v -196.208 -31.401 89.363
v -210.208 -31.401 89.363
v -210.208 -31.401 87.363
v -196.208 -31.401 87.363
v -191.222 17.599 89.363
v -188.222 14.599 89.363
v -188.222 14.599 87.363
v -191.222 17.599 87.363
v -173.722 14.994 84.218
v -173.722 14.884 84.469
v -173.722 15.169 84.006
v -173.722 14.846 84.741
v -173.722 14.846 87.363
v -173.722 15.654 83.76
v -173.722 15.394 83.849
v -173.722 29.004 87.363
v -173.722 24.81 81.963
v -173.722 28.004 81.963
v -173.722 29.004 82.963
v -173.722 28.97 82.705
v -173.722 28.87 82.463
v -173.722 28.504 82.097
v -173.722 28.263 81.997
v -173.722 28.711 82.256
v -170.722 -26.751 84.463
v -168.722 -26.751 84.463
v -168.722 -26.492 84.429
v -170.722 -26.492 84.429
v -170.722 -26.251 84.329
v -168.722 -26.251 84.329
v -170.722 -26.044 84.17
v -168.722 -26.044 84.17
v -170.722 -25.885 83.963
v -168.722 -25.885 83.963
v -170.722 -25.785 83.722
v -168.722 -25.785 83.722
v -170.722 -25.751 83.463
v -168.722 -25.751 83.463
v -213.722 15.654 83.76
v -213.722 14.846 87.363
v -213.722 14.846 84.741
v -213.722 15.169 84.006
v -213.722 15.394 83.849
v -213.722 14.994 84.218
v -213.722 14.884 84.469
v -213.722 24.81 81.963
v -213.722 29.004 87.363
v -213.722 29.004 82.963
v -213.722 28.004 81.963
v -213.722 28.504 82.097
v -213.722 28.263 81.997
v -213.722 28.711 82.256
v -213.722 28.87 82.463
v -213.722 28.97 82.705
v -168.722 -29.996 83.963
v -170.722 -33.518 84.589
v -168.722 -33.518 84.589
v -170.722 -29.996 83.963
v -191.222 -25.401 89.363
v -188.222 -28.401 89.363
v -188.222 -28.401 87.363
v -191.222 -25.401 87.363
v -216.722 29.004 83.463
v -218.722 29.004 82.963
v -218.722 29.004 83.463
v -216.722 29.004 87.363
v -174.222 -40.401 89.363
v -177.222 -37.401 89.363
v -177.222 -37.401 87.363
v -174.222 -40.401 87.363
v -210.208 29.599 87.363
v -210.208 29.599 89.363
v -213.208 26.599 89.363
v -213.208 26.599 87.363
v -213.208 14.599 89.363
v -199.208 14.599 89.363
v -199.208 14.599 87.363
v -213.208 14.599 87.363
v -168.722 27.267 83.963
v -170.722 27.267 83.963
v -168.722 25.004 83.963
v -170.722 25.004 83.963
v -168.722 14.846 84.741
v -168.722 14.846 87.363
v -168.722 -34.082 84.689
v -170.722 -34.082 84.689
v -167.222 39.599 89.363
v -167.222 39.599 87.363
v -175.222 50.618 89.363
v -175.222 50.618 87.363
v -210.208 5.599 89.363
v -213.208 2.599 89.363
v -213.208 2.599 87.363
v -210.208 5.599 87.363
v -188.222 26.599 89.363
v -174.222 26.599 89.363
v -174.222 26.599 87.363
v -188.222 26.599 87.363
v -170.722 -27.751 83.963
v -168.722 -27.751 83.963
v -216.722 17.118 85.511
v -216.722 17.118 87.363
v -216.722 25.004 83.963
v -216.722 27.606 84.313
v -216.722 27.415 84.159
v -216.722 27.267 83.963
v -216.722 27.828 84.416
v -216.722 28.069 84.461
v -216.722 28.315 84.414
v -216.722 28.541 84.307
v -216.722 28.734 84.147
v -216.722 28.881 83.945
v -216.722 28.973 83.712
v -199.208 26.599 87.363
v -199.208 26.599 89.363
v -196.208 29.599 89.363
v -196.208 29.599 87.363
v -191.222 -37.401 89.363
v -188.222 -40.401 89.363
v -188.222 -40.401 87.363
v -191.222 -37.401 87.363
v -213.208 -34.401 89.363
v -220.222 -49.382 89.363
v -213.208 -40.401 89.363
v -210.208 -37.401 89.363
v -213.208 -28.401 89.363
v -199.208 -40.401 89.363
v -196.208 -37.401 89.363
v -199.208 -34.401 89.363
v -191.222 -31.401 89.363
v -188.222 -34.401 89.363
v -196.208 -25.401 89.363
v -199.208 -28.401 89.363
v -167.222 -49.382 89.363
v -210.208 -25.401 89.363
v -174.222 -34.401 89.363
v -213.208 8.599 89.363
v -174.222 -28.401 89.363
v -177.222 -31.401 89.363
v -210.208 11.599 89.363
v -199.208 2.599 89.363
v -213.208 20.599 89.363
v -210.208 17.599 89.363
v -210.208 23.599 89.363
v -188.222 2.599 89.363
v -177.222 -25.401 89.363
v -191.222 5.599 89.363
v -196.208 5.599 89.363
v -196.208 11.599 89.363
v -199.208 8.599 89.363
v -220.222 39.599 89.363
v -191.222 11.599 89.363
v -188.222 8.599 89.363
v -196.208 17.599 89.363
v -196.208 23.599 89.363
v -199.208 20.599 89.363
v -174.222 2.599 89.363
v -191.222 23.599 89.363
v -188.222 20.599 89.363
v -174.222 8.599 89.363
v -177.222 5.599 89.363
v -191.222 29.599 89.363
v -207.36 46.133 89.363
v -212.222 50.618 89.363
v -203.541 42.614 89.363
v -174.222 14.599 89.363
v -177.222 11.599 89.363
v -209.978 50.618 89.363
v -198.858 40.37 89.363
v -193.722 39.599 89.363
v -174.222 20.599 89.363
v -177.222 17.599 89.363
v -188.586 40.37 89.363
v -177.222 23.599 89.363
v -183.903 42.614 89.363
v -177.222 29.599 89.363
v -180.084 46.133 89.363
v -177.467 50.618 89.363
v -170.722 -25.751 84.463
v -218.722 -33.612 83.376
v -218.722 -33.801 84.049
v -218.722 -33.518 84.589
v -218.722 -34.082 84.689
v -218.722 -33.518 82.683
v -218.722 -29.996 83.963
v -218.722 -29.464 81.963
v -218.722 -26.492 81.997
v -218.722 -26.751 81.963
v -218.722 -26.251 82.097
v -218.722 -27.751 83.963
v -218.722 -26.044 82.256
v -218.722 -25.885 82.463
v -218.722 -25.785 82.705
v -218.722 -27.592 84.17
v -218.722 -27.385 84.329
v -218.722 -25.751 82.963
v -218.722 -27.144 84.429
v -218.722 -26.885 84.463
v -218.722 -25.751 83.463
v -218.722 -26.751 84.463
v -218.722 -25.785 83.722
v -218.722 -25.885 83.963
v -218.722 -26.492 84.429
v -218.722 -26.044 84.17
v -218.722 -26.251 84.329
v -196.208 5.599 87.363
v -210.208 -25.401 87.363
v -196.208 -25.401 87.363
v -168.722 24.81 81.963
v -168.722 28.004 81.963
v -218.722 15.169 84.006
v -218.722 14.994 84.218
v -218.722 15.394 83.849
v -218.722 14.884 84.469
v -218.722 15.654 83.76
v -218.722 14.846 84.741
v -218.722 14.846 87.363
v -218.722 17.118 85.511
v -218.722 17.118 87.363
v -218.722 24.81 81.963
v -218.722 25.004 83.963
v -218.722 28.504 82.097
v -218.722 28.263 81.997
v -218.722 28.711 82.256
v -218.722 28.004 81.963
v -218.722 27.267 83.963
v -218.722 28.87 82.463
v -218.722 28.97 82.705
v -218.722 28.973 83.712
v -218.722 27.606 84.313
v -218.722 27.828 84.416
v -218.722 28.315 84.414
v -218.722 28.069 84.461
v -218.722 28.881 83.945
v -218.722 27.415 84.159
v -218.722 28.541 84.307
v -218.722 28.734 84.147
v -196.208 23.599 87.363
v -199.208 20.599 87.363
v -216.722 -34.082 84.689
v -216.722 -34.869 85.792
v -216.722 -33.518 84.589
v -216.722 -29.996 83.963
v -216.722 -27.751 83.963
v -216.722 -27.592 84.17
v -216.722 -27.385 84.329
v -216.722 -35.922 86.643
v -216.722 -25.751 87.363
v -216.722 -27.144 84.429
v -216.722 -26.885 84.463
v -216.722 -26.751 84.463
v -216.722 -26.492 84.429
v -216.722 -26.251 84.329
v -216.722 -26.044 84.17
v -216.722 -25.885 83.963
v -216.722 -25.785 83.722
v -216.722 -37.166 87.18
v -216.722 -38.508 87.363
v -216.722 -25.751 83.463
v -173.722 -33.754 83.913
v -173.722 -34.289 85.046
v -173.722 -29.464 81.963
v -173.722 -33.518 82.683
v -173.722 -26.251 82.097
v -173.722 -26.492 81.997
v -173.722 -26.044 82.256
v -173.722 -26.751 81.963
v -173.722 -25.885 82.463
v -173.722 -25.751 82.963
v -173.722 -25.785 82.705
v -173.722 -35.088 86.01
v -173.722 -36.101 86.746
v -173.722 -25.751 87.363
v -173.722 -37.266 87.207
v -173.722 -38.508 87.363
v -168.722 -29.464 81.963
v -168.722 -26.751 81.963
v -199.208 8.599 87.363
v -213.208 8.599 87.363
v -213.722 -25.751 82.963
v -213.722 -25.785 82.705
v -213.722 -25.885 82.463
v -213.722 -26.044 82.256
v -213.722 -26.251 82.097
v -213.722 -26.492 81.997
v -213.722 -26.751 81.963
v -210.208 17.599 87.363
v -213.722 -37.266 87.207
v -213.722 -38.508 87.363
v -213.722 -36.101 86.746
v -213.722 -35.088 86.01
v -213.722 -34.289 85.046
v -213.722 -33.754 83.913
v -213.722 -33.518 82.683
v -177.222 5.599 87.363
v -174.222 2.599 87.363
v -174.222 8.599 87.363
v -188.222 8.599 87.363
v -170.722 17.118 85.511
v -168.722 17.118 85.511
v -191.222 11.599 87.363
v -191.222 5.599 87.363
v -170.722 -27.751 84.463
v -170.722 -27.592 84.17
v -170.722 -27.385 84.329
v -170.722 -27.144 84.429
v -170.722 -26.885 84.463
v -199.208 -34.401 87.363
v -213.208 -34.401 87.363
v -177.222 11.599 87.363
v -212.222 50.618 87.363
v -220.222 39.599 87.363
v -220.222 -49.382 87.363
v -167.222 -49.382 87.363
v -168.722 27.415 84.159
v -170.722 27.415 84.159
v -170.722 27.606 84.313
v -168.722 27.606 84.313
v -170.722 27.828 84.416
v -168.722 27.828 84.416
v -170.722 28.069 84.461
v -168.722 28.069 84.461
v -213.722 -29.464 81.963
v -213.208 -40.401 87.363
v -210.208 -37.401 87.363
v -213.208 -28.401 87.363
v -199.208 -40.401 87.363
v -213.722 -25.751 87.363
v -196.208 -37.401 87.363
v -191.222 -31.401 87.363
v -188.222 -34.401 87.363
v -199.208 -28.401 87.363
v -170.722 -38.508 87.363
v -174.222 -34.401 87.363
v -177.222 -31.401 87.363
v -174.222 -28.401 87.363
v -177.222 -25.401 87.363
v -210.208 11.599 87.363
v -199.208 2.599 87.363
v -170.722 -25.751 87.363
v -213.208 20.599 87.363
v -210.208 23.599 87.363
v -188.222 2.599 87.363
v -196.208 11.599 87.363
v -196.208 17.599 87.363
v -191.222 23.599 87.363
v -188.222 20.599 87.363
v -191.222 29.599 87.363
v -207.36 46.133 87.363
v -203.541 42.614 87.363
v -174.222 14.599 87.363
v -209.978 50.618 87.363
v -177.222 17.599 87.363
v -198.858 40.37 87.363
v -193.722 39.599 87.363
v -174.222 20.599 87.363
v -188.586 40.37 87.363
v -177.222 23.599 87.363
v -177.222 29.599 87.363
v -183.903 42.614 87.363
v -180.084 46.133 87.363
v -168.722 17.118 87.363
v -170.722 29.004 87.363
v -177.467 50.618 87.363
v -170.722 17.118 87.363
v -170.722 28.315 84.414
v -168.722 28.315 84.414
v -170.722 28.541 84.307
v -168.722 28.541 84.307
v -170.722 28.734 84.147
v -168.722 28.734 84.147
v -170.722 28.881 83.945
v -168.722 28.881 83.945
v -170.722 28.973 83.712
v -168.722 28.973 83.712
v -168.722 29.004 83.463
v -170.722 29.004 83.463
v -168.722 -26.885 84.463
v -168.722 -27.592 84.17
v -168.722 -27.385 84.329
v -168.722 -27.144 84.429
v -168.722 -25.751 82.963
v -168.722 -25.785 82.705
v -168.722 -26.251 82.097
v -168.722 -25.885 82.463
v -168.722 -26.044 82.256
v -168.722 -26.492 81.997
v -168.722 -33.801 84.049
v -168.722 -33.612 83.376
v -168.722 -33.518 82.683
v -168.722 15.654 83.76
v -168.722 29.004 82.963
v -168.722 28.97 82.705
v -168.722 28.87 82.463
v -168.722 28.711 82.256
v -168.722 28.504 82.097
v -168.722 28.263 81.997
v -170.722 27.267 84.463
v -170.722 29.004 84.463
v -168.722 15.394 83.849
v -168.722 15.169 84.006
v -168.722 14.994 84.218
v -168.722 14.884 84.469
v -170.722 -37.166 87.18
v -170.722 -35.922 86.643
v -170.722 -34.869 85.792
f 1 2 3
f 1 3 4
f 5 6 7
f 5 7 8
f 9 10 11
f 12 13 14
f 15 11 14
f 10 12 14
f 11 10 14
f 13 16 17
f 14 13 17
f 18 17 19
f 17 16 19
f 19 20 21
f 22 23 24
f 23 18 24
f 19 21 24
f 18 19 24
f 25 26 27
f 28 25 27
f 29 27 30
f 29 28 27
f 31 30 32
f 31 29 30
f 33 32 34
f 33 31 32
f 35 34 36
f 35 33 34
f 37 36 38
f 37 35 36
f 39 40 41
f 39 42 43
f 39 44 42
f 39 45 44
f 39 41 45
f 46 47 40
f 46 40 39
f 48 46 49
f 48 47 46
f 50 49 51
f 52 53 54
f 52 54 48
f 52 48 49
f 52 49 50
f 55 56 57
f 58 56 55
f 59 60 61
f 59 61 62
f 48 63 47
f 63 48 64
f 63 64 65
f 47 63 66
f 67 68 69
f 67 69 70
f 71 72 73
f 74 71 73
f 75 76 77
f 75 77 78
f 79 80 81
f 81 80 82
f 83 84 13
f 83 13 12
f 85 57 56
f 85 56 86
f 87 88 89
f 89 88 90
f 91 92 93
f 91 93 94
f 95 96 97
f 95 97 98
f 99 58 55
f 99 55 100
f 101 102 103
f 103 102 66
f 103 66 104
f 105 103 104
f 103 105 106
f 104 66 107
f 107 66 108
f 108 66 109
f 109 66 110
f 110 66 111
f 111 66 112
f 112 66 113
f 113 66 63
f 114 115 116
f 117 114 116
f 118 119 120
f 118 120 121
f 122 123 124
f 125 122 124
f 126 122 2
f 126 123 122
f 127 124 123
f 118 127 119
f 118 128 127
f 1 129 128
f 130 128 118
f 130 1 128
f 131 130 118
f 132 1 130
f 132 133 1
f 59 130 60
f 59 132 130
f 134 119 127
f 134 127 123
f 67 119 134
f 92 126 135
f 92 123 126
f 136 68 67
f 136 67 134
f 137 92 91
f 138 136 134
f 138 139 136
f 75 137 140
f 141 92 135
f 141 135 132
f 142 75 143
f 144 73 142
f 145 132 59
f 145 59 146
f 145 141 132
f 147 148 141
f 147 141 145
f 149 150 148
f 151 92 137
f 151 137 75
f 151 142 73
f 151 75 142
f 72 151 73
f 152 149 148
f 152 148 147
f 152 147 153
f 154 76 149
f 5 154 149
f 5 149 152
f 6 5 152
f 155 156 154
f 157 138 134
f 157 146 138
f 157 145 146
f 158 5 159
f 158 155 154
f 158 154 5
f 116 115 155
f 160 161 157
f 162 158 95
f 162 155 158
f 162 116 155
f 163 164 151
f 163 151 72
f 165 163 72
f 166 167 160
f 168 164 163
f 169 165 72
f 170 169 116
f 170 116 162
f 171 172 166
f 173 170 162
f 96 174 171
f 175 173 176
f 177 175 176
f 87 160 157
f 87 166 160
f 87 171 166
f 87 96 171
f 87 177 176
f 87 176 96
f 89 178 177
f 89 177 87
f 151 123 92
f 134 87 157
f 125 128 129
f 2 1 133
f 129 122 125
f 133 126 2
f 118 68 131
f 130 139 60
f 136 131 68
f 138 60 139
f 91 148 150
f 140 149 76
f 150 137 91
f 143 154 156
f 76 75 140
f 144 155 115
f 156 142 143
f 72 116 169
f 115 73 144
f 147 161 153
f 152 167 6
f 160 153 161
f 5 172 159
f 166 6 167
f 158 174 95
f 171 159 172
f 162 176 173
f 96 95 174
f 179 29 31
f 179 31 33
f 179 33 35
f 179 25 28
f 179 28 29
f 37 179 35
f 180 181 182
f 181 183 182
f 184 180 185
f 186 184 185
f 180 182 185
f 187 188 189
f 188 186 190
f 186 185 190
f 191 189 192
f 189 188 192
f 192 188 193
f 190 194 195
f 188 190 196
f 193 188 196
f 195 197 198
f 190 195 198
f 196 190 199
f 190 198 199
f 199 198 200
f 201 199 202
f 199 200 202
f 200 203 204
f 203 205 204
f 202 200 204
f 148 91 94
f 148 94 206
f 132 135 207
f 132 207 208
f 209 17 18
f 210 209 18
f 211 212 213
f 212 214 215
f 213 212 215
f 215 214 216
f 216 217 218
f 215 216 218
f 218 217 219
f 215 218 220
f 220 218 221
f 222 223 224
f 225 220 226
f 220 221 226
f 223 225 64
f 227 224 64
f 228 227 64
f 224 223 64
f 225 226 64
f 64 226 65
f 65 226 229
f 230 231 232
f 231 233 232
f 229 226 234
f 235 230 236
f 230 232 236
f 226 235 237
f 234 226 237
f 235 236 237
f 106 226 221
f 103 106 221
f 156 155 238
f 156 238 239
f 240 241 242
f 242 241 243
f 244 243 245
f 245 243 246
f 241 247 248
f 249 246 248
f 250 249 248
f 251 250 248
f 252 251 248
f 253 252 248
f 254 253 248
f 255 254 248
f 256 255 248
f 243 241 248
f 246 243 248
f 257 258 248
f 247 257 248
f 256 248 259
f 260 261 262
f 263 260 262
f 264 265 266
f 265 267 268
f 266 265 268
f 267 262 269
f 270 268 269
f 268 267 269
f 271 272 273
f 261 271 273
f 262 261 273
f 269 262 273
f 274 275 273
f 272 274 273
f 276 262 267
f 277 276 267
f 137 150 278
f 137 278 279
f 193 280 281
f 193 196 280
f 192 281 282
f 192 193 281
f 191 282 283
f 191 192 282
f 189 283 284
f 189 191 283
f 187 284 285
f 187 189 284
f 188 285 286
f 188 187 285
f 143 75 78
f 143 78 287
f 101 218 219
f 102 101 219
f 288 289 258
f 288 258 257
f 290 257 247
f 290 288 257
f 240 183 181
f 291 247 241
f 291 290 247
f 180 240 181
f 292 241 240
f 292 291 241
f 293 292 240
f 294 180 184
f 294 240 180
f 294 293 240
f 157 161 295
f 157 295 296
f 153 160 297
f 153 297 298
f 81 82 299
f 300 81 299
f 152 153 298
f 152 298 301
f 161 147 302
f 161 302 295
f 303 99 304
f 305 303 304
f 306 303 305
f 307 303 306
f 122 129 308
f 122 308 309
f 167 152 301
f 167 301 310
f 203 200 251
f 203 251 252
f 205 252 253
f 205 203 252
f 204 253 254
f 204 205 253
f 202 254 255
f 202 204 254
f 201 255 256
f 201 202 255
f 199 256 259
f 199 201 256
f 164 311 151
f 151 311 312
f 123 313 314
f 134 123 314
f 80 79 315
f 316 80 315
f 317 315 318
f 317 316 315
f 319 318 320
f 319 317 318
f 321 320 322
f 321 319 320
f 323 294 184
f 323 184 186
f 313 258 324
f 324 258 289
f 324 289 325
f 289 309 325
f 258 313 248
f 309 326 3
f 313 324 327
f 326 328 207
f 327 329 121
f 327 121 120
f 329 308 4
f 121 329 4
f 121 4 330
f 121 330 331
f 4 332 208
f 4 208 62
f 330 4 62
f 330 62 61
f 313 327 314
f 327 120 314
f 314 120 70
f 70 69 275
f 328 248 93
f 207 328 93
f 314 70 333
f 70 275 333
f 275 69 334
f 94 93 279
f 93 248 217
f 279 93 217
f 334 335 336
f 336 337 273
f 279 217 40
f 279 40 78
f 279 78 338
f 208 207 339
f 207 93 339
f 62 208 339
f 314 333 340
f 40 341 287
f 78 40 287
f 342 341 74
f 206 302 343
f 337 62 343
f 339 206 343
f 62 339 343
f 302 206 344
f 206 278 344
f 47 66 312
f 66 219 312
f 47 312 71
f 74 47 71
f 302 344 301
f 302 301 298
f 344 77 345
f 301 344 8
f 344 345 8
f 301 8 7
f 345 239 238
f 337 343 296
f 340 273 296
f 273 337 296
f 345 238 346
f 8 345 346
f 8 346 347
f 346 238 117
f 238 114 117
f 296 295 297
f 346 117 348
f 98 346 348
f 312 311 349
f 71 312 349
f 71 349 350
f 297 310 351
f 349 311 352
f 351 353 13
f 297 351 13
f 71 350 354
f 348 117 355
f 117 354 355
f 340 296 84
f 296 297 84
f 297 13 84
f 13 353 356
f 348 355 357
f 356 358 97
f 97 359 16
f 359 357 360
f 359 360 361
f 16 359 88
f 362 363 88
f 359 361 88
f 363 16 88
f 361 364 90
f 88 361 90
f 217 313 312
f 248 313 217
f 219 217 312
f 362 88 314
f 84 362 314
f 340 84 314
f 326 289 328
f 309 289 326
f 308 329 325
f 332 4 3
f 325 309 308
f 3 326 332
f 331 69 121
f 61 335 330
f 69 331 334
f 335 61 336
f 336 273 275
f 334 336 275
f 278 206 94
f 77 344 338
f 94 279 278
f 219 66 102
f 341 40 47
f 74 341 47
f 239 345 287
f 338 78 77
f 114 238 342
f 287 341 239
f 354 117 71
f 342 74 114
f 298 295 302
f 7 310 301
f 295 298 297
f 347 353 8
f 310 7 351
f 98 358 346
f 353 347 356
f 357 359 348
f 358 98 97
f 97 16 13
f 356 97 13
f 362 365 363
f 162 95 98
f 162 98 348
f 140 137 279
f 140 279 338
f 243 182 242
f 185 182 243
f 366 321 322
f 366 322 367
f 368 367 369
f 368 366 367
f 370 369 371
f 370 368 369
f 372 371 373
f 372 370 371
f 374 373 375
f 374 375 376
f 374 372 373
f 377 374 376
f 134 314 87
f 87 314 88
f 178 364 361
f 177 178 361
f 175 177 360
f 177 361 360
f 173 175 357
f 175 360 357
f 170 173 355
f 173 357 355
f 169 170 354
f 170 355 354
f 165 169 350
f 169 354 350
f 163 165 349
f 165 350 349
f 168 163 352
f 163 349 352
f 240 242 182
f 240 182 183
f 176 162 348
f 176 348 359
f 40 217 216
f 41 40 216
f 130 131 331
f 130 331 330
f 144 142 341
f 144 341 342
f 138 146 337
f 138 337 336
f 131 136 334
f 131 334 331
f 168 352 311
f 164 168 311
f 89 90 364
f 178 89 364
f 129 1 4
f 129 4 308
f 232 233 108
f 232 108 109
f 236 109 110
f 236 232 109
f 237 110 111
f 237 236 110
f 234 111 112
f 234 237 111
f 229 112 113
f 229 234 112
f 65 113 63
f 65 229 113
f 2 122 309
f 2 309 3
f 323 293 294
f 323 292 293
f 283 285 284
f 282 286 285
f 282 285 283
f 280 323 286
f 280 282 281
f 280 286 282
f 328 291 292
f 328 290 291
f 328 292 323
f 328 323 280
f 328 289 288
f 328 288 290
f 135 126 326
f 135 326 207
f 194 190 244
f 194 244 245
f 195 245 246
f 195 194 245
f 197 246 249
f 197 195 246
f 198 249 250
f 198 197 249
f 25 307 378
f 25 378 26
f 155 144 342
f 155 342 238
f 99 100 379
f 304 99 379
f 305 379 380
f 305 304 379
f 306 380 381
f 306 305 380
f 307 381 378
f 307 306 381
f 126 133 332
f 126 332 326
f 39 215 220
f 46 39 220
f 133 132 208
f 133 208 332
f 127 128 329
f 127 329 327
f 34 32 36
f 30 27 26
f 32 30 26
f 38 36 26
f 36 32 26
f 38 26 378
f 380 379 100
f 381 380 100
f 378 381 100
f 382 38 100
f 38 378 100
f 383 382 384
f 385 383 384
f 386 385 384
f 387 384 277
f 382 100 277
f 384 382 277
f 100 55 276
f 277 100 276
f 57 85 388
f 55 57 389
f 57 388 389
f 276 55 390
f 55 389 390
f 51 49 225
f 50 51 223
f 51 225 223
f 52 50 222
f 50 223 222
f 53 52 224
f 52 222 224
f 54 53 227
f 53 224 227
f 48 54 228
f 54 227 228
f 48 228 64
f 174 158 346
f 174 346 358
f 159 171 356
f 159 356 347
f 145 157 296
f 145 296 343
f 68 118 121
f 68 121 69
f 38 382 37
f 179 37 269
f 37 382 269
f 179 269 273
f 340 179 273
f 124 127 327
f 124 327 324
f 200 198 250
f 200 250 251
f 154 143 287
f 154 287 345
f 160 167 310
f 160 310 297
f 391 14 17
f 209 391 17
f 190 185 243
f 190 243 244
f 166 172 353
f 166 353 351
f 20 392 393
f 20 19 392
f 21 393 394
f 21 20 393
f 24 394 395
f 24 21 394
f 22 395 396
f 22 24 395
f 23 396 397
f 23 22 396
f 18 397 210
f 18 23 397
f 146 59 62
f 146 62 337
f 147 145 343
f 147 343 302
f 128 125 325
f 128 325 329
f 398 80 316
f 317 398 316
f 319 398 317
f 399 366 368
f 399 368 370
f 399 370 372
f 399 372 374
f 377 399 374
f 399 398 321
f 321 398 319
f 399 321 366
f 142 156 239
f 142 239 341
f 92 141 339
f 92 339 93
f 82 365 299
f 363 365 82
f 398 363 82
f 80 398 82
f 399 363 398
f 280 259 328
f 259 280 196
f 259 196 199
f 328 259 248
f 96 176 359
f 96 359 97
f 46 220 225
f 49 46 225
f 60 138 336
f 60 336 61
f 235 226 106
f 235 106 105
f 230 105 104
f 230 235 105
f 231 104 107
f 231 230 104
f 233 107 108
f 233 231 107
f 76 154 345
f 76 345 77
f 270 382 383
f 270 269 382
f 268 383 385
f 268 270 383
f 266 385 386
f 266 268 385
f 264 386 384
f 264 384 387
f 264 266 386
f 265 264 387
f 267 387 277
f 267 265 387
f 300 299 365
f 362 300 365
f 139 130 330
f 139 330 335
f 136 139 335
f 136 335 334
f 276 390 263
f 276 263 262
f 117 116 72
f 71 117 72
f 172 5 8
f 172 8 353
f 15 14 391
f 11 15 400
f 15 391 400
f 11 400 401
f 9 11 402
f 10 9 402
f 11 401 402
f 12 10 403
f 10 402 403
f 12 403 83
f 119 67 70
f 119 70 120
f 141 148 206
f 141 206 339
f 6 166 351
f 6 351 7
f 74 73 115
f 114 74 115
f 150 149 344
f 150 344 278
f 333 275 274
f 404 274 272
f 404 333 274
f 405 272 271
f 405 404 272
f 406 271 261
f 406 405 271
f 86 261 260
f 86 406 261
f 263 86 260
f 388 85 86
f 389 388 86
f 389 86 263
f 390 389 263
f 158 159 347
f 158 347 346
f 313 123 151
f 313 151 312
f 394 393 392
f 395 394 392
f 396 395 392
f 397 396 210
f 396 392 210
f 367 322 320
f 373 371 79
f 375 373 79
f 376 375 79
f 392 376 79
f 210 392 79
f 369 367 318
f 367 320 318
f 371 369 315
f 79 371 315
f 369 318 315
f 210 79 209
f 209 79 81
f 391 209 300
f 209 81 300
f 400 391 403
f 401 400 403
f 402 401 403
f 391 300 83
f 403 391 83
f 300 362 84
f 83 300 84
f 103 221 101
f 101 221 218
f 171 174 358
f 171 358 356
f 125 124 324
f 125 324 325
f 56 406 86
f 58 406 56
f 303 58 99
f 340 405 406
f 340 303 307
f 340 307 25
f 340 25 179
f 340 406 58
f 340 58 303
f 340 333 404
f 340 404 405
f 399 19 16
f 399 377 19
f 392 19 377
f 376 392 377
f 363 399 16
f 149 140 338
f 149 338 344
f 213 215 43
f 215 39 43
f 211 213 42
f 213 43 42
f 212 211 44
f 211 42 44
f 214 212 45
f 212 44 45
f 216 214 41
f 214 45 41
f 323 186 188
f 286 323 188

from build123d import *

# Parameters (mm, degrees)
BOSS_EXTRU_1_DEPTH      = 2
BOSS_EXTRU_3_START      = -53
BOSS_EXTRU_3_DEPTH      = 53.000012
ENL_V_MAT_EXTRU_1_REACH = 228.086
BOSS_EXTRU_4_START      = -3.5
BOSS_EXTRU_4_DEPTH      = 3
BOSS_EXTRU_5_START      = -49.5
BOSS_EXTRU_5_DEPTH      = 3
BOSS_EXTRU_6_START      = -6.499983
BOSS_EXTRU_6_DEPTH      = 3.000004
BOSS_EXTRU_7_START      = -49.5
BOSS_EXTRU_7_DEPTH      = 3
ENL_V_MAT_EXTRU_4_REACH = 228.029
CONG_1_START            = -218.722210076
CONG_1_DEPTH            = 2
CONG_1_START_2          = -170.722192301
CONG_1_2_DEPTH          = 1.999982225
CONG_1_START_3          = -170.722210076
CONG_1_3_DEPTH          = 0.188775796
CONG_3_R                = 1
ENL_V_MAT_EXTRU_3_DEPTH = 227.085814543
ENL_V_START             = -5.4
ESQUISSE8_W             = 57.405681666
ESQUISSE8_H             = 8.808279197
ENL_V_MAT_EXTRU_6_DEPTH = 5.4
CONG_5_R                = 5


with BuildPart() as part:
    # Esquisse1 → Boss.-Extru.1 (new body)
    with BuildSketch(Plane.XY.offset(87.363371848)):
        with BuildLine():
            Line((-209.977886558, 50.618314147), (-212.222210076, 50.618314147))
            Line((-212.222210076, 50.618314147), (-220.222210076, 39.599284914))
            Line((-220.222210076, 39.599284914), (-220.222210076, -49.381685853))
            Line((-220.222210076, -49.381685853), (-167.222210076, -49.381685853))
            Line((-167.222210076, -49.381685853), (-167.222210076, 39.599284914))
            Line((-167.222210076, 39.599284914), (-175.222210076, 50.618314147))
            Line((-175.222210076, 50.618314147), (-177.466533593, 50.618314147))
            ThreePointArc((-177.466533593, 50.618314147), (-193.722210076, 39.599284914), (-209.977886558, 50.618314147))
        make_face()
    extrude(amount=BOSS_EXTRU_1_DEPTH)

    # Esquisse2 → Boss.-Extru.3 (add)
    with BuildSketch(Plane(origin=(-167.222210076, 0, 0), x_dir=(0, 0, -1), z_dir=(1, 0, 0)).offset(BOSS_EXTRU_3_START)):
        Polygon((-83.963371848, 25.004241463), (-85.510615846, 17.118314147), (-87.363371848, 17.118314147), (-87.363371848, 14.846338453), (-83.918252525, 14.846338453), (-81.963371848, 24.809891037), (-81.963371848, 29.004241463), (-84.463371848, 29.004241463), (-84.463371848, 27.267232592), (-83.963371848, 27.267232592), align=None)
        Polygon((-87.363371848, -39.881685853), (-87.363371848, -37.881685853), (-85.363371848, -37.881685853), (-83.963371848, -29.995758537), (-83.963371848, -27.750975606), (-84.463371848, -27.750975606), (-84.463371848, -25.750975606), (-81.963371848, -25.750975606), (-81.963371848, -29.464435342), (-83.81276129, -39.881685853), align=None)
    extrude(amount=BOSS_EXTRU_3_DEPTH)

    # Enlèv. mat.-Extru.1: up to this face of the body (flat: up to its plane)
    enl_v_mat_extru_1_end = Plane(part.part.faces().sort_by_distance((-193.722210076, 30.844149197, 87.363371848))[0])
    # Esquisse4 → Enlèv. mat.-Extru.1 (cut, up to the picked face)
    with BuildSketch(Plane(origin=(0, 0, 81.963371848), x_dir=(-1, 0, 0), z_dir=(0, 0, -1)), mode=Mode.PRIVATE) as enl_v_mat_extru_1_sk1:
        Polygon((170.722207248, 29.004241463), (216.722210076, 29.004241463), (216.722210076, -45.719527558), (170.722187305, -45.719527558), align=None)
    enl_v_mat_extru_1_tool1 = split(extrude(enl_v_mat_extru_1_sk1.sketch, amount=-ENL_V_MAT_EXTRU_1_REACH, mode=Mode.PRIVATE), bisect_by=enl_v_mat_extru_1_end, keep=Keep.BOTH, mode=Mode.PRIVATE)
    add(enl_v_mat_extru_1_tool1.solids().sort_by(Axis((-193.722204, -8.357646, 81.963372), (0, 0, 1)))[0], mode=Mode.SUBTRACT)


with BuildPart() as boss_extru_4_tool:
    # Esquisse2<4> → Boss.-Extru.4 (new body)
    with BuildSketch(Plane(origin=(-167.222210076, 0, 0), x_dir=(0, 0, -1), z_dir=(1, 0, 0)).offset(BOSS_EXTRU_4_START)):
        Polygon((-81.963371848, 29.004241463), (-88.413322327, 29.004241463), (-88.741836901, 17.118314147), (-88.741836901, 14.846338453), (-83.918252525, 14.846338453), (-81.963371848, 24.809891037), align=None)
    extrude(amount=-BOSS_EXTRU_4_DEPTH)


with BuildPart() as part_1:
    add(part.part)


with BuildPart() as part_2:
    # Boss.-Extru.4: joined with boss_extru_4_tool
    add(part_1.part.fuse(boss_extru_4_tool.part, tol=0.00001))

    # Esquisse2<5> → Boss.-Extru.5 (add)
    with BuildSketch(Plane(origin=(-167.222210076, 0, 0), x_dir=(0, 0, -1), z_dir=(1, 0, 0)).offset(BOSS_EXTRU_5_START)):
        Polygon((-87.363371848, 17.118314147), (-85.510615846, 17.118314147), (-83.963371848, 25.004241463), (-83.963371848, 27.267232592), (-84.463371848, 27.267232592), (-84.463371848, 29.004241463), (-87.363371848, 29.004241463), align=None)
        Polygon((-83.963371848, 25.004241463), (-85.510615846, 17.118314147), (-87.363371848, 17.118314147), (-87.363371848, 14.846338453), (-83.918252525, 14.846338453), (-81.963371848, 24.809891037), (-81.963371848, 29.004241463), (-84.463371848, 29.004241463), (-84.463371848, 27.267232592), (-83.963371848, 27.267232592), align=None)
    extrude(amount=BOSS_EXTRU_5_DEPTH)

    # Esquisse2<6> → Boss.-Extru.6 (add)
    with BuildSketch(Plane(origin=(-167.222210076, 0, 0), x_dir=(0, 0, -1), z_dir=(1, 0, 0)).offset(BOSS_EXTRU_6_START)):
        Polygon((-83.963371848, 25.004241463), (-85.510615846, 17.118314147), (-87.363371848, 17.118314147), (-88.741836901, 17.118314147), (-88.741836901, 14.846338453), (-83.918252525, 14.846338453), (-81.963371848, 24.809891037), (-81.963371848, 29.004241463), (-84.463371848, 29.004241463), (-84.463371848, 27.267232592), (-83.963371848, 27.267232592), align=None)
        Polygon((-87.363371848, 17.118314147), (-85.510615846, 17.118314147), (-83.963371848, 25.004241463), (-83.963371848, 27.267232592), (-84.463371848, 27.267232592), (-84.463371848, 29.004241463), (-88.413322327, 29.004241463), (-88.741836901, 17.118314147), align=None)
        Polygon((-83.963371848, -29.995758537), (-83.963371848, -27.750975606), (-84.463371848, -27.750975606), (-84.463371848, -25.750975606), (-87.363371848, -25.750975606), (-87.363371848, -37.881685853), (-85.363371848, -37.881685853), align=None)
        Polygon((-84.463371848, -27.750975606), (-83.963371848, -27.750975606), (-83.963371848, -29.995758537), (-85.363371848, -37.881685853), (-87.363371848, -37.881685853), (-87.363371848, -39.881685853), (-83.81276129, -39.881685853), (-81.963371848, -29.464435342), (-81.963371848, -25.750975606), (-84.463371848, -25.750975606), align=None)
    extrude(amount=BOSS_EXTRU_6_DEPTH)

    # Esquisse2<9> → Boss.-Extru.7 (add)
    with BuildSketch(Plane(origin=(-167.222210076, 0, 0), x_dir=(0, 0, -1), z_dir=(1, 0, 0)).offset(BOSS_EXTRU_7_START)):
        Polygon((-84.463371848, -25.750975606), (-87.363371848, -25.750975606), (-87.363371848, -37.881685853), (-85.363371848, -37.881685853), (-83.963371848, -29.995758537), (-83.963371848, -27.750975606), (-84.463371848, -27.750975606), align=None)
        Polygon((-81.963371848, -25.750975606), (-84.463371848, -25.750975606), (-84.463371848, -27.750975606), (-83.963371848, -27.750975606), (-83.963371848, -29.995758537), (-85.363371848, -37.881685853), (-87.363371848, -37.881685853), (-87.363371848, -39.881685853), (-83.81276129, -39.881685853), (-81.963371848, -29.464435342), align=None)
    extrude(amount=BOSS_EXTRU_7_DEPTH)

    # Enlèv. mat.-Extru.4: up to this face of the body (flat: up to its plane)
    enl_v_mat_extru_4_end = Plane(part_2.part.faces().sort_by_distance((-170.472204076, 26.90706625, 81.963371848))[0])
    # Esquisse7 → Enlèv. mat.-Extru.4 (cut, up to the picked face)
    with BuildSketch(Plane(origin=(0, 0, 87.363371848), x_dir=(-1, 0, 0), z_dir=(0, 0, -1)), mode=Mode.PRIVATE) as enl_v_mat_extru_4_sk1:
        Polygon((168.722210076, 33.372292481), (168.722210076, -47.881685853), (218.722210076, -47.881685853), (218.722210076, 33.372292481), (220.222210076, 33.372292481), (220.222210076, -49.381685853), (167.222210076, -49.381685853), (167.222208414, 33.372292481), align=None)
    enl_v_mat_extru_4_tool1 = split(extrude(enl_v_mat_extru_4_sk1.sketch, amount=ENL_V_MAT_EXTRU_4_REACH, mode=Mode.PRIVATE), bisect_by=enl_v_mat_extru_4_end, keep=Keep.BOTH, mode=Mode.PRIVATE)
    add(enl_v_mat_extru_4_tool1.solids().sort_by(Axis((-167.739498, -7.254697, 87.363372), (0, 0, -1)))[0], mode=Mode.SUBTRACT)


with BuildPart() as enl_v_mat_extru_4_kept_piece:
    # of the separate pieces the step leaves, the one the design keeps (enl_v_mat_extru_4_pieces_kept)
    add(part_2.part.solids().sort_by_distance((-209.977886558, 50.618314147, 87.363371848))[0])

    # Congé1: read off the stored shape, not the designer's step
    # Congé1 outline → Congé1 (cut)
    with BuildSketch(Plane.YZ.offset(CONG_1_START)):
        with BuildLine():
            Line((-27.750975606, 84.463371848), (-27.750975606, 83.963371848))
            ThreePointArc((-27.750975606, 83.963371848), (-27.384950202, 84.329397252), (-26.884950202, 84.463371848))
            Line((-26.884950202, 84.463371848), (-27.750975606, 84.463371848))
        make_face()
        with BuildLine():
            Line((-25.750975606, 84.463371848), (-26.750975606, 84.463371848))
            ThreePointArc((-26.750975606, 84.463371848), (-26.043868825, 84.170478629), (-25.750975606, 83.463371848))
            Line((-25.750975606, 83.463371848), (-25.750975606, 84.463371848))
        make_face()
        with BuildLine():
            ThreePointArc((28.06874973, 84.461289021), (28.733798955, 84.147291337), (29.004241463, 83.463371848))
            Line((29.004241463, 83.463371848), (29.004241463, 84.463371848))
            Line((29.004241463, 84.463371848), (27.267232592, 84.463371848))
            Line((27.267232592, 84.463371848), (27.267232592, 83.963371848))
            ThreePointArc((27.267232592, 83.963371848), (27.605570962, 84.312810718), (28.06874973, 84.461289021))
        make_face()
    extrude(amount=CONG_1_DEPTH, mode=Mode.SUBTRACT)

    # Cong_1 2 outline → Cong_1 2 (cut)
    with BuildSketch(Plane.YZ.offset(CONG_1_START_2)):
        with BuildLine():
            Line((-27.750975606, 84.463371848), (-27.750975606, 83.963371848))
            ThreePointArc((-27.750975606, 83.963371848), (-27.384950202, 84.329397252), (-26.884950202, 84.463371848))
            Line((-26.884950202, 84.463371848), (-27.750975606, 84.463371848))
        make_face()
        with BuildLine():
            Line((-25.750975606, 84.463371848), (-26.750975606, 84.463371848))
            ThreePointArc((-26.750975606, 84.463371848), (-26.043868825, 84.170478629), (-25.750975606, 83.463371848))
            Line((-25.750975606, 83.463371848), (-25.750975606, 84.463371848))
        make_face()
        with BuildLine():
            ThreePointArc((28.06874973, 84.461289021), (28.733798955, 84.147291337), (29.004241463, 83.463371848))
            Line((29.004241463, 83.463371848), (29.004241463, 84.463371848))
            Line((29.004241463, 84.463371848), (27.267232592, 84.463371848))
            Line((27.267232592, 84.463371848), (27.267232592, 83.963371848))
            ThreePointArc((27.267232592, 83.963371848), (27.605570962, 84.312810718), (28.06874973, 84.461289021))
        make_face()
    extrude(amount=CONG_1_2_DEPTH, mode=Mode.SUBTRACT)

    # Cong_1 3 outline → Cong_1 3 (cut)
    with BuildSketch(Plane.YZ.offset(CONG_1_START_3)):
        with BuildLine():
            ThreePointArc((28.06874973, 84.461289021), (28.733798955, 84.147291337), (29.004241463, 83.463371848))
            Line((29.004241463, 83.463371848), (29.004241463, 84.463371848))
            Line((29.004241463, 84.463371848), (27.267232592, 84.463371848))
            Line((27.267232592, 84.463371848), (27.267232592, 83.963371848))
            ThreePointArc((27.267232592, 83.963371848), (27.605570962, 84.312810718), (28.06874973, 84.461289021))
        make_face()
    extrude(amount=CONG_1_3_DEPTH, mode=Mode.SUBTRACT)

    # Congé3
    cong_3_edges = [enl_v_mat_extru_4_kept_piece.edges().sort_by_distance(p)[0] for p in [
        (-171.222210076, 29.004241463, 81.963371848),
        (-171.222210076, 14.846338453, 83.918252525),
        (-171.222201576, -39.881685853, 83.81276129),
        (-171.222201576, -25.750975606, 81.963371848),
        (-216.222210076, 29.004241463, 81.963371848),
        (-216.222210076, 14.846338453, 83.918252525),
        (-216.222210076, -39.881685853, 83.81276129),
        (-216.222210076, -25.750975606, 81.963371848),
    ]]
    fillet(cong_3_edges, radius=CONG_3_R)

    # Esquisse6 → Enlèv. mat.-Extru.3 (cut, through all)
    with BuildSketch(Plane.XY.offset(89.363371848)):
        Polygon((-191.222210076, 29.599284914), (-177.222210076, 29.599284914), (-174.222210076, 26.599284914), (-188.222210076, 26.599284914), align=None)
        Polygon((-191.222210076, -31.400715086), (-177.222210076, -31.400715086), (-174.222210076, -34.400715086), (-188.222210076, -34.400715086), align=None)
        Polygon((-191.222210076, 23.599284914), (-177.222210076, 23.599284914), (-174.222210076, 20.599284914), (-188.222210076, 20.599284914), align=None)
        Polygon((-191.222210076, 17.599284914), (-177.222210076, 17.599284914), (-174.222210076, 14.599284914), (-188.222210076, 14.599284914), align=None)
        Polygon((-191.222210076, 11.599284914), (-177.222210076, 11.599284914), (-174.222210076, 8.599284914), (-188.222210076, 8.599284914), align=None)
        Polygon((-191.222210076, 5.599284914), (-177.222210076, 5.599284914), (-174.222210076, 2.599284914), (-188.222210076, 2.599284914), align=None)
        Polygon((-191.222210076, -25.400715086), (-177.222210076, -25.400715086), (-174.222210076, -28.400715086), (-188.222210076, -28.400715086), align=None)
        Polygon((-191.222210076, -37.400715086), (-177.222210076, -37.400715086), (-174.222210076, -40.400715086), (-188.222210076, -40.400715086), align=None)
        Polygon((-210.207786747, 29.599284914), (-213.207786747, 26.599284914), (-199.207786747, 26.599284914), (-196.207786747, 29.599284914), align=None)
        Polygon((-196.207786747, -37.400715086), (-199.207786747, -40.400715086), (-213.207786747, -40.400715086), (-210.207786747, -37.400715086), align=None)
        Polygon((-196.207786747, -31.400715086), (-199.207786747, -34.400715086), (-213.207786747, -34.400715086), (-210.207786747, -31.400715086), align=None)
        Polygon((-196.207786747, 5.599284914), (-199.207786747, 2.599284914), (-213.207786747, 2.599284914), (-210.207786747, 5.599284914), align=None)
        Polygon((-196.207786747, 11.599284914), (-199.207786747, 8.599284914), (-213.207786747, 8.599284914), (-210.207786747, 11.599284914), align=None)
        Polygon((-196.207786747, 17.599284914), (-199.207786747, 14.599284914), (-213.207786747, 14.599284914), (-210.207786747, 17.599284914), align=None)
        Polygon((-196.207786747, 23.599284914), (-199.207786747, 20.599284914), (-213.207786747, 20.599284914), (-210.207786747, 23.599284914), align=None)
        Polygon((-196.207786747, -25.400715086), (-199.207786747, -28.400715086), (-213.207786747, -28.400715086), (-210.207786747, -25.400715086), align=None)
    extrude(amount=-ENL_V_MAT_EXTRU_3_DEPTH, mode=Mode.SUBTRACT)

    # Esquisse8 → Enlèv. mat.-Extru.6 (cut)
    with BuildSketch(Plane(origin=(0, 0, 81.963371848), x_dir=(-1, 0, 0), z_dir=(0, 0, -1)).offset(ENL_V_START)):
        with Locations((193.926049586, -37.922540866)):
            Rectangle(ESQUISSE8_W, ESQUISSE8_H)
    extrude(amount=ENL_V_MAT_EXTRU_6_DEPTH, mode=Mode.SUBTRACT)

    # Congé5
    # the kernel refuses this fillet: 5 mm, written as the material it adds along each edge
    with BuildSketch(Plane(origin=(-170.722189076, -33.518401267, 87.363371848), x_dir=(0, -1, 0), z_dir=(-1, 0, 0))) as cong_5_piece_1:
        with BuildLine():
            CenterArc((4.989768314, -5), CONG_5_R, 90, 86.333933602)
            Line((0, -4.680293608), (0, 0))
            Line((0, 0), (4.989768314, 0))
        make_face()
    extrude(amount=3.000004)
    with BuildSketch(Plane(origin=(-158.247768292, -33.518401267, 87.363371848), x_dir=(0, -1, 0), z_dir=(-1, 0, 0))) as cong_5_piece_2_section:
        with BuildLine():
            CenterArc((4.989768314, -5), CONG_5_R, 90, 86.333933602)
            Line((0, -4.680293608), (0, 0))
            Line((0, 0), (4.989768314, 0))
        make_face()
    cong_5_piece_2 = extrude(amount=27.948845568, mode=Mode.PRIVATE)
    cong_5_piece_2 = split(cong_5_piece_2, bisect_by=Plane(origin=(-158.247768292, -33.995933007, 84.673528566), z_dir=(0, -0.17479821137928658, -0.9846042785295026)), keep=Keep.TOP, mode=Mode.PRIVATE)
    cong_5_piece_2 = split(cong_5_piece_2, bisect_by=Plane(origin=(-168.722210076, -33.518401267, 87.363371848), z_dir=(-1, 0, 0)), keep=Keep.TOP, mode=Mode.PRIVATE)
    cong_5_piece_2 = split(cong_5_piece_2, bisect_by=Plane(origin=(-170.722189076, -33.518401267, 87.363371848), z_dir=(1, 0, 0)), keep=Keep.TOP, mode=Mode.PRIVATE)
    add(cong_5_piece_2)
    with BuildSketch(Plane(origin=(-213.722210076, -33.518401267, 87.363371848), x_dir=(0, -1, 0), z_dir=(-1, 0, 0))) as cong_5_piece_3:
        with BuildLine():
            CenterArc((4.989768314, -5), CONG_5_R, 90, 86.333933602)
            Line((0, -4.680293608), (0, 0))
            Line((0, 0), (4.989768314, 0))
        make_face()
    extrude(amount=3)
    with BuildSketch(Plane(origin=(-213.722210076, -33.518401267, 87.363371848), x_dir=(0, -1, 0), z_dir=(-1, 0, 0))) as cong_5_piece_4_section:
        with BuildLine():
            CenterArc((4.989768314, -5), CONG_5_R, 90, 86.333933602)
            Line((0, -4.680293608), (0, 0))
            Line((0, 0), (4.989768314, 0))
        make_face()
    cong_5_piece_4 = extrude(amount=15.474420784, mode=Mode.PRIVATE)
    cong_5_piece_4 = split(cong_5_piece_4, bisect_by=Plane(origin=(-213.722210076, -33.995933007, 84.673528566), z_dir=(0, -0.17479821137928658, -0.9846042785295026)), keep=Keep.TOP, mode=Mode.PRIVATE)
    cong_5_piece_4 = split(cong_5_piece_4, bisect_by=Plane(origin=(-218.722210076, -33.518401267, 87.363371848), z_dir=(1, 0, 0)), keep=Keep.TOP, mode=Mode.PRIVATE)
    add(cong_5_piece_4)


solid = enl_v_mat_extru_4_kept_piece.part
